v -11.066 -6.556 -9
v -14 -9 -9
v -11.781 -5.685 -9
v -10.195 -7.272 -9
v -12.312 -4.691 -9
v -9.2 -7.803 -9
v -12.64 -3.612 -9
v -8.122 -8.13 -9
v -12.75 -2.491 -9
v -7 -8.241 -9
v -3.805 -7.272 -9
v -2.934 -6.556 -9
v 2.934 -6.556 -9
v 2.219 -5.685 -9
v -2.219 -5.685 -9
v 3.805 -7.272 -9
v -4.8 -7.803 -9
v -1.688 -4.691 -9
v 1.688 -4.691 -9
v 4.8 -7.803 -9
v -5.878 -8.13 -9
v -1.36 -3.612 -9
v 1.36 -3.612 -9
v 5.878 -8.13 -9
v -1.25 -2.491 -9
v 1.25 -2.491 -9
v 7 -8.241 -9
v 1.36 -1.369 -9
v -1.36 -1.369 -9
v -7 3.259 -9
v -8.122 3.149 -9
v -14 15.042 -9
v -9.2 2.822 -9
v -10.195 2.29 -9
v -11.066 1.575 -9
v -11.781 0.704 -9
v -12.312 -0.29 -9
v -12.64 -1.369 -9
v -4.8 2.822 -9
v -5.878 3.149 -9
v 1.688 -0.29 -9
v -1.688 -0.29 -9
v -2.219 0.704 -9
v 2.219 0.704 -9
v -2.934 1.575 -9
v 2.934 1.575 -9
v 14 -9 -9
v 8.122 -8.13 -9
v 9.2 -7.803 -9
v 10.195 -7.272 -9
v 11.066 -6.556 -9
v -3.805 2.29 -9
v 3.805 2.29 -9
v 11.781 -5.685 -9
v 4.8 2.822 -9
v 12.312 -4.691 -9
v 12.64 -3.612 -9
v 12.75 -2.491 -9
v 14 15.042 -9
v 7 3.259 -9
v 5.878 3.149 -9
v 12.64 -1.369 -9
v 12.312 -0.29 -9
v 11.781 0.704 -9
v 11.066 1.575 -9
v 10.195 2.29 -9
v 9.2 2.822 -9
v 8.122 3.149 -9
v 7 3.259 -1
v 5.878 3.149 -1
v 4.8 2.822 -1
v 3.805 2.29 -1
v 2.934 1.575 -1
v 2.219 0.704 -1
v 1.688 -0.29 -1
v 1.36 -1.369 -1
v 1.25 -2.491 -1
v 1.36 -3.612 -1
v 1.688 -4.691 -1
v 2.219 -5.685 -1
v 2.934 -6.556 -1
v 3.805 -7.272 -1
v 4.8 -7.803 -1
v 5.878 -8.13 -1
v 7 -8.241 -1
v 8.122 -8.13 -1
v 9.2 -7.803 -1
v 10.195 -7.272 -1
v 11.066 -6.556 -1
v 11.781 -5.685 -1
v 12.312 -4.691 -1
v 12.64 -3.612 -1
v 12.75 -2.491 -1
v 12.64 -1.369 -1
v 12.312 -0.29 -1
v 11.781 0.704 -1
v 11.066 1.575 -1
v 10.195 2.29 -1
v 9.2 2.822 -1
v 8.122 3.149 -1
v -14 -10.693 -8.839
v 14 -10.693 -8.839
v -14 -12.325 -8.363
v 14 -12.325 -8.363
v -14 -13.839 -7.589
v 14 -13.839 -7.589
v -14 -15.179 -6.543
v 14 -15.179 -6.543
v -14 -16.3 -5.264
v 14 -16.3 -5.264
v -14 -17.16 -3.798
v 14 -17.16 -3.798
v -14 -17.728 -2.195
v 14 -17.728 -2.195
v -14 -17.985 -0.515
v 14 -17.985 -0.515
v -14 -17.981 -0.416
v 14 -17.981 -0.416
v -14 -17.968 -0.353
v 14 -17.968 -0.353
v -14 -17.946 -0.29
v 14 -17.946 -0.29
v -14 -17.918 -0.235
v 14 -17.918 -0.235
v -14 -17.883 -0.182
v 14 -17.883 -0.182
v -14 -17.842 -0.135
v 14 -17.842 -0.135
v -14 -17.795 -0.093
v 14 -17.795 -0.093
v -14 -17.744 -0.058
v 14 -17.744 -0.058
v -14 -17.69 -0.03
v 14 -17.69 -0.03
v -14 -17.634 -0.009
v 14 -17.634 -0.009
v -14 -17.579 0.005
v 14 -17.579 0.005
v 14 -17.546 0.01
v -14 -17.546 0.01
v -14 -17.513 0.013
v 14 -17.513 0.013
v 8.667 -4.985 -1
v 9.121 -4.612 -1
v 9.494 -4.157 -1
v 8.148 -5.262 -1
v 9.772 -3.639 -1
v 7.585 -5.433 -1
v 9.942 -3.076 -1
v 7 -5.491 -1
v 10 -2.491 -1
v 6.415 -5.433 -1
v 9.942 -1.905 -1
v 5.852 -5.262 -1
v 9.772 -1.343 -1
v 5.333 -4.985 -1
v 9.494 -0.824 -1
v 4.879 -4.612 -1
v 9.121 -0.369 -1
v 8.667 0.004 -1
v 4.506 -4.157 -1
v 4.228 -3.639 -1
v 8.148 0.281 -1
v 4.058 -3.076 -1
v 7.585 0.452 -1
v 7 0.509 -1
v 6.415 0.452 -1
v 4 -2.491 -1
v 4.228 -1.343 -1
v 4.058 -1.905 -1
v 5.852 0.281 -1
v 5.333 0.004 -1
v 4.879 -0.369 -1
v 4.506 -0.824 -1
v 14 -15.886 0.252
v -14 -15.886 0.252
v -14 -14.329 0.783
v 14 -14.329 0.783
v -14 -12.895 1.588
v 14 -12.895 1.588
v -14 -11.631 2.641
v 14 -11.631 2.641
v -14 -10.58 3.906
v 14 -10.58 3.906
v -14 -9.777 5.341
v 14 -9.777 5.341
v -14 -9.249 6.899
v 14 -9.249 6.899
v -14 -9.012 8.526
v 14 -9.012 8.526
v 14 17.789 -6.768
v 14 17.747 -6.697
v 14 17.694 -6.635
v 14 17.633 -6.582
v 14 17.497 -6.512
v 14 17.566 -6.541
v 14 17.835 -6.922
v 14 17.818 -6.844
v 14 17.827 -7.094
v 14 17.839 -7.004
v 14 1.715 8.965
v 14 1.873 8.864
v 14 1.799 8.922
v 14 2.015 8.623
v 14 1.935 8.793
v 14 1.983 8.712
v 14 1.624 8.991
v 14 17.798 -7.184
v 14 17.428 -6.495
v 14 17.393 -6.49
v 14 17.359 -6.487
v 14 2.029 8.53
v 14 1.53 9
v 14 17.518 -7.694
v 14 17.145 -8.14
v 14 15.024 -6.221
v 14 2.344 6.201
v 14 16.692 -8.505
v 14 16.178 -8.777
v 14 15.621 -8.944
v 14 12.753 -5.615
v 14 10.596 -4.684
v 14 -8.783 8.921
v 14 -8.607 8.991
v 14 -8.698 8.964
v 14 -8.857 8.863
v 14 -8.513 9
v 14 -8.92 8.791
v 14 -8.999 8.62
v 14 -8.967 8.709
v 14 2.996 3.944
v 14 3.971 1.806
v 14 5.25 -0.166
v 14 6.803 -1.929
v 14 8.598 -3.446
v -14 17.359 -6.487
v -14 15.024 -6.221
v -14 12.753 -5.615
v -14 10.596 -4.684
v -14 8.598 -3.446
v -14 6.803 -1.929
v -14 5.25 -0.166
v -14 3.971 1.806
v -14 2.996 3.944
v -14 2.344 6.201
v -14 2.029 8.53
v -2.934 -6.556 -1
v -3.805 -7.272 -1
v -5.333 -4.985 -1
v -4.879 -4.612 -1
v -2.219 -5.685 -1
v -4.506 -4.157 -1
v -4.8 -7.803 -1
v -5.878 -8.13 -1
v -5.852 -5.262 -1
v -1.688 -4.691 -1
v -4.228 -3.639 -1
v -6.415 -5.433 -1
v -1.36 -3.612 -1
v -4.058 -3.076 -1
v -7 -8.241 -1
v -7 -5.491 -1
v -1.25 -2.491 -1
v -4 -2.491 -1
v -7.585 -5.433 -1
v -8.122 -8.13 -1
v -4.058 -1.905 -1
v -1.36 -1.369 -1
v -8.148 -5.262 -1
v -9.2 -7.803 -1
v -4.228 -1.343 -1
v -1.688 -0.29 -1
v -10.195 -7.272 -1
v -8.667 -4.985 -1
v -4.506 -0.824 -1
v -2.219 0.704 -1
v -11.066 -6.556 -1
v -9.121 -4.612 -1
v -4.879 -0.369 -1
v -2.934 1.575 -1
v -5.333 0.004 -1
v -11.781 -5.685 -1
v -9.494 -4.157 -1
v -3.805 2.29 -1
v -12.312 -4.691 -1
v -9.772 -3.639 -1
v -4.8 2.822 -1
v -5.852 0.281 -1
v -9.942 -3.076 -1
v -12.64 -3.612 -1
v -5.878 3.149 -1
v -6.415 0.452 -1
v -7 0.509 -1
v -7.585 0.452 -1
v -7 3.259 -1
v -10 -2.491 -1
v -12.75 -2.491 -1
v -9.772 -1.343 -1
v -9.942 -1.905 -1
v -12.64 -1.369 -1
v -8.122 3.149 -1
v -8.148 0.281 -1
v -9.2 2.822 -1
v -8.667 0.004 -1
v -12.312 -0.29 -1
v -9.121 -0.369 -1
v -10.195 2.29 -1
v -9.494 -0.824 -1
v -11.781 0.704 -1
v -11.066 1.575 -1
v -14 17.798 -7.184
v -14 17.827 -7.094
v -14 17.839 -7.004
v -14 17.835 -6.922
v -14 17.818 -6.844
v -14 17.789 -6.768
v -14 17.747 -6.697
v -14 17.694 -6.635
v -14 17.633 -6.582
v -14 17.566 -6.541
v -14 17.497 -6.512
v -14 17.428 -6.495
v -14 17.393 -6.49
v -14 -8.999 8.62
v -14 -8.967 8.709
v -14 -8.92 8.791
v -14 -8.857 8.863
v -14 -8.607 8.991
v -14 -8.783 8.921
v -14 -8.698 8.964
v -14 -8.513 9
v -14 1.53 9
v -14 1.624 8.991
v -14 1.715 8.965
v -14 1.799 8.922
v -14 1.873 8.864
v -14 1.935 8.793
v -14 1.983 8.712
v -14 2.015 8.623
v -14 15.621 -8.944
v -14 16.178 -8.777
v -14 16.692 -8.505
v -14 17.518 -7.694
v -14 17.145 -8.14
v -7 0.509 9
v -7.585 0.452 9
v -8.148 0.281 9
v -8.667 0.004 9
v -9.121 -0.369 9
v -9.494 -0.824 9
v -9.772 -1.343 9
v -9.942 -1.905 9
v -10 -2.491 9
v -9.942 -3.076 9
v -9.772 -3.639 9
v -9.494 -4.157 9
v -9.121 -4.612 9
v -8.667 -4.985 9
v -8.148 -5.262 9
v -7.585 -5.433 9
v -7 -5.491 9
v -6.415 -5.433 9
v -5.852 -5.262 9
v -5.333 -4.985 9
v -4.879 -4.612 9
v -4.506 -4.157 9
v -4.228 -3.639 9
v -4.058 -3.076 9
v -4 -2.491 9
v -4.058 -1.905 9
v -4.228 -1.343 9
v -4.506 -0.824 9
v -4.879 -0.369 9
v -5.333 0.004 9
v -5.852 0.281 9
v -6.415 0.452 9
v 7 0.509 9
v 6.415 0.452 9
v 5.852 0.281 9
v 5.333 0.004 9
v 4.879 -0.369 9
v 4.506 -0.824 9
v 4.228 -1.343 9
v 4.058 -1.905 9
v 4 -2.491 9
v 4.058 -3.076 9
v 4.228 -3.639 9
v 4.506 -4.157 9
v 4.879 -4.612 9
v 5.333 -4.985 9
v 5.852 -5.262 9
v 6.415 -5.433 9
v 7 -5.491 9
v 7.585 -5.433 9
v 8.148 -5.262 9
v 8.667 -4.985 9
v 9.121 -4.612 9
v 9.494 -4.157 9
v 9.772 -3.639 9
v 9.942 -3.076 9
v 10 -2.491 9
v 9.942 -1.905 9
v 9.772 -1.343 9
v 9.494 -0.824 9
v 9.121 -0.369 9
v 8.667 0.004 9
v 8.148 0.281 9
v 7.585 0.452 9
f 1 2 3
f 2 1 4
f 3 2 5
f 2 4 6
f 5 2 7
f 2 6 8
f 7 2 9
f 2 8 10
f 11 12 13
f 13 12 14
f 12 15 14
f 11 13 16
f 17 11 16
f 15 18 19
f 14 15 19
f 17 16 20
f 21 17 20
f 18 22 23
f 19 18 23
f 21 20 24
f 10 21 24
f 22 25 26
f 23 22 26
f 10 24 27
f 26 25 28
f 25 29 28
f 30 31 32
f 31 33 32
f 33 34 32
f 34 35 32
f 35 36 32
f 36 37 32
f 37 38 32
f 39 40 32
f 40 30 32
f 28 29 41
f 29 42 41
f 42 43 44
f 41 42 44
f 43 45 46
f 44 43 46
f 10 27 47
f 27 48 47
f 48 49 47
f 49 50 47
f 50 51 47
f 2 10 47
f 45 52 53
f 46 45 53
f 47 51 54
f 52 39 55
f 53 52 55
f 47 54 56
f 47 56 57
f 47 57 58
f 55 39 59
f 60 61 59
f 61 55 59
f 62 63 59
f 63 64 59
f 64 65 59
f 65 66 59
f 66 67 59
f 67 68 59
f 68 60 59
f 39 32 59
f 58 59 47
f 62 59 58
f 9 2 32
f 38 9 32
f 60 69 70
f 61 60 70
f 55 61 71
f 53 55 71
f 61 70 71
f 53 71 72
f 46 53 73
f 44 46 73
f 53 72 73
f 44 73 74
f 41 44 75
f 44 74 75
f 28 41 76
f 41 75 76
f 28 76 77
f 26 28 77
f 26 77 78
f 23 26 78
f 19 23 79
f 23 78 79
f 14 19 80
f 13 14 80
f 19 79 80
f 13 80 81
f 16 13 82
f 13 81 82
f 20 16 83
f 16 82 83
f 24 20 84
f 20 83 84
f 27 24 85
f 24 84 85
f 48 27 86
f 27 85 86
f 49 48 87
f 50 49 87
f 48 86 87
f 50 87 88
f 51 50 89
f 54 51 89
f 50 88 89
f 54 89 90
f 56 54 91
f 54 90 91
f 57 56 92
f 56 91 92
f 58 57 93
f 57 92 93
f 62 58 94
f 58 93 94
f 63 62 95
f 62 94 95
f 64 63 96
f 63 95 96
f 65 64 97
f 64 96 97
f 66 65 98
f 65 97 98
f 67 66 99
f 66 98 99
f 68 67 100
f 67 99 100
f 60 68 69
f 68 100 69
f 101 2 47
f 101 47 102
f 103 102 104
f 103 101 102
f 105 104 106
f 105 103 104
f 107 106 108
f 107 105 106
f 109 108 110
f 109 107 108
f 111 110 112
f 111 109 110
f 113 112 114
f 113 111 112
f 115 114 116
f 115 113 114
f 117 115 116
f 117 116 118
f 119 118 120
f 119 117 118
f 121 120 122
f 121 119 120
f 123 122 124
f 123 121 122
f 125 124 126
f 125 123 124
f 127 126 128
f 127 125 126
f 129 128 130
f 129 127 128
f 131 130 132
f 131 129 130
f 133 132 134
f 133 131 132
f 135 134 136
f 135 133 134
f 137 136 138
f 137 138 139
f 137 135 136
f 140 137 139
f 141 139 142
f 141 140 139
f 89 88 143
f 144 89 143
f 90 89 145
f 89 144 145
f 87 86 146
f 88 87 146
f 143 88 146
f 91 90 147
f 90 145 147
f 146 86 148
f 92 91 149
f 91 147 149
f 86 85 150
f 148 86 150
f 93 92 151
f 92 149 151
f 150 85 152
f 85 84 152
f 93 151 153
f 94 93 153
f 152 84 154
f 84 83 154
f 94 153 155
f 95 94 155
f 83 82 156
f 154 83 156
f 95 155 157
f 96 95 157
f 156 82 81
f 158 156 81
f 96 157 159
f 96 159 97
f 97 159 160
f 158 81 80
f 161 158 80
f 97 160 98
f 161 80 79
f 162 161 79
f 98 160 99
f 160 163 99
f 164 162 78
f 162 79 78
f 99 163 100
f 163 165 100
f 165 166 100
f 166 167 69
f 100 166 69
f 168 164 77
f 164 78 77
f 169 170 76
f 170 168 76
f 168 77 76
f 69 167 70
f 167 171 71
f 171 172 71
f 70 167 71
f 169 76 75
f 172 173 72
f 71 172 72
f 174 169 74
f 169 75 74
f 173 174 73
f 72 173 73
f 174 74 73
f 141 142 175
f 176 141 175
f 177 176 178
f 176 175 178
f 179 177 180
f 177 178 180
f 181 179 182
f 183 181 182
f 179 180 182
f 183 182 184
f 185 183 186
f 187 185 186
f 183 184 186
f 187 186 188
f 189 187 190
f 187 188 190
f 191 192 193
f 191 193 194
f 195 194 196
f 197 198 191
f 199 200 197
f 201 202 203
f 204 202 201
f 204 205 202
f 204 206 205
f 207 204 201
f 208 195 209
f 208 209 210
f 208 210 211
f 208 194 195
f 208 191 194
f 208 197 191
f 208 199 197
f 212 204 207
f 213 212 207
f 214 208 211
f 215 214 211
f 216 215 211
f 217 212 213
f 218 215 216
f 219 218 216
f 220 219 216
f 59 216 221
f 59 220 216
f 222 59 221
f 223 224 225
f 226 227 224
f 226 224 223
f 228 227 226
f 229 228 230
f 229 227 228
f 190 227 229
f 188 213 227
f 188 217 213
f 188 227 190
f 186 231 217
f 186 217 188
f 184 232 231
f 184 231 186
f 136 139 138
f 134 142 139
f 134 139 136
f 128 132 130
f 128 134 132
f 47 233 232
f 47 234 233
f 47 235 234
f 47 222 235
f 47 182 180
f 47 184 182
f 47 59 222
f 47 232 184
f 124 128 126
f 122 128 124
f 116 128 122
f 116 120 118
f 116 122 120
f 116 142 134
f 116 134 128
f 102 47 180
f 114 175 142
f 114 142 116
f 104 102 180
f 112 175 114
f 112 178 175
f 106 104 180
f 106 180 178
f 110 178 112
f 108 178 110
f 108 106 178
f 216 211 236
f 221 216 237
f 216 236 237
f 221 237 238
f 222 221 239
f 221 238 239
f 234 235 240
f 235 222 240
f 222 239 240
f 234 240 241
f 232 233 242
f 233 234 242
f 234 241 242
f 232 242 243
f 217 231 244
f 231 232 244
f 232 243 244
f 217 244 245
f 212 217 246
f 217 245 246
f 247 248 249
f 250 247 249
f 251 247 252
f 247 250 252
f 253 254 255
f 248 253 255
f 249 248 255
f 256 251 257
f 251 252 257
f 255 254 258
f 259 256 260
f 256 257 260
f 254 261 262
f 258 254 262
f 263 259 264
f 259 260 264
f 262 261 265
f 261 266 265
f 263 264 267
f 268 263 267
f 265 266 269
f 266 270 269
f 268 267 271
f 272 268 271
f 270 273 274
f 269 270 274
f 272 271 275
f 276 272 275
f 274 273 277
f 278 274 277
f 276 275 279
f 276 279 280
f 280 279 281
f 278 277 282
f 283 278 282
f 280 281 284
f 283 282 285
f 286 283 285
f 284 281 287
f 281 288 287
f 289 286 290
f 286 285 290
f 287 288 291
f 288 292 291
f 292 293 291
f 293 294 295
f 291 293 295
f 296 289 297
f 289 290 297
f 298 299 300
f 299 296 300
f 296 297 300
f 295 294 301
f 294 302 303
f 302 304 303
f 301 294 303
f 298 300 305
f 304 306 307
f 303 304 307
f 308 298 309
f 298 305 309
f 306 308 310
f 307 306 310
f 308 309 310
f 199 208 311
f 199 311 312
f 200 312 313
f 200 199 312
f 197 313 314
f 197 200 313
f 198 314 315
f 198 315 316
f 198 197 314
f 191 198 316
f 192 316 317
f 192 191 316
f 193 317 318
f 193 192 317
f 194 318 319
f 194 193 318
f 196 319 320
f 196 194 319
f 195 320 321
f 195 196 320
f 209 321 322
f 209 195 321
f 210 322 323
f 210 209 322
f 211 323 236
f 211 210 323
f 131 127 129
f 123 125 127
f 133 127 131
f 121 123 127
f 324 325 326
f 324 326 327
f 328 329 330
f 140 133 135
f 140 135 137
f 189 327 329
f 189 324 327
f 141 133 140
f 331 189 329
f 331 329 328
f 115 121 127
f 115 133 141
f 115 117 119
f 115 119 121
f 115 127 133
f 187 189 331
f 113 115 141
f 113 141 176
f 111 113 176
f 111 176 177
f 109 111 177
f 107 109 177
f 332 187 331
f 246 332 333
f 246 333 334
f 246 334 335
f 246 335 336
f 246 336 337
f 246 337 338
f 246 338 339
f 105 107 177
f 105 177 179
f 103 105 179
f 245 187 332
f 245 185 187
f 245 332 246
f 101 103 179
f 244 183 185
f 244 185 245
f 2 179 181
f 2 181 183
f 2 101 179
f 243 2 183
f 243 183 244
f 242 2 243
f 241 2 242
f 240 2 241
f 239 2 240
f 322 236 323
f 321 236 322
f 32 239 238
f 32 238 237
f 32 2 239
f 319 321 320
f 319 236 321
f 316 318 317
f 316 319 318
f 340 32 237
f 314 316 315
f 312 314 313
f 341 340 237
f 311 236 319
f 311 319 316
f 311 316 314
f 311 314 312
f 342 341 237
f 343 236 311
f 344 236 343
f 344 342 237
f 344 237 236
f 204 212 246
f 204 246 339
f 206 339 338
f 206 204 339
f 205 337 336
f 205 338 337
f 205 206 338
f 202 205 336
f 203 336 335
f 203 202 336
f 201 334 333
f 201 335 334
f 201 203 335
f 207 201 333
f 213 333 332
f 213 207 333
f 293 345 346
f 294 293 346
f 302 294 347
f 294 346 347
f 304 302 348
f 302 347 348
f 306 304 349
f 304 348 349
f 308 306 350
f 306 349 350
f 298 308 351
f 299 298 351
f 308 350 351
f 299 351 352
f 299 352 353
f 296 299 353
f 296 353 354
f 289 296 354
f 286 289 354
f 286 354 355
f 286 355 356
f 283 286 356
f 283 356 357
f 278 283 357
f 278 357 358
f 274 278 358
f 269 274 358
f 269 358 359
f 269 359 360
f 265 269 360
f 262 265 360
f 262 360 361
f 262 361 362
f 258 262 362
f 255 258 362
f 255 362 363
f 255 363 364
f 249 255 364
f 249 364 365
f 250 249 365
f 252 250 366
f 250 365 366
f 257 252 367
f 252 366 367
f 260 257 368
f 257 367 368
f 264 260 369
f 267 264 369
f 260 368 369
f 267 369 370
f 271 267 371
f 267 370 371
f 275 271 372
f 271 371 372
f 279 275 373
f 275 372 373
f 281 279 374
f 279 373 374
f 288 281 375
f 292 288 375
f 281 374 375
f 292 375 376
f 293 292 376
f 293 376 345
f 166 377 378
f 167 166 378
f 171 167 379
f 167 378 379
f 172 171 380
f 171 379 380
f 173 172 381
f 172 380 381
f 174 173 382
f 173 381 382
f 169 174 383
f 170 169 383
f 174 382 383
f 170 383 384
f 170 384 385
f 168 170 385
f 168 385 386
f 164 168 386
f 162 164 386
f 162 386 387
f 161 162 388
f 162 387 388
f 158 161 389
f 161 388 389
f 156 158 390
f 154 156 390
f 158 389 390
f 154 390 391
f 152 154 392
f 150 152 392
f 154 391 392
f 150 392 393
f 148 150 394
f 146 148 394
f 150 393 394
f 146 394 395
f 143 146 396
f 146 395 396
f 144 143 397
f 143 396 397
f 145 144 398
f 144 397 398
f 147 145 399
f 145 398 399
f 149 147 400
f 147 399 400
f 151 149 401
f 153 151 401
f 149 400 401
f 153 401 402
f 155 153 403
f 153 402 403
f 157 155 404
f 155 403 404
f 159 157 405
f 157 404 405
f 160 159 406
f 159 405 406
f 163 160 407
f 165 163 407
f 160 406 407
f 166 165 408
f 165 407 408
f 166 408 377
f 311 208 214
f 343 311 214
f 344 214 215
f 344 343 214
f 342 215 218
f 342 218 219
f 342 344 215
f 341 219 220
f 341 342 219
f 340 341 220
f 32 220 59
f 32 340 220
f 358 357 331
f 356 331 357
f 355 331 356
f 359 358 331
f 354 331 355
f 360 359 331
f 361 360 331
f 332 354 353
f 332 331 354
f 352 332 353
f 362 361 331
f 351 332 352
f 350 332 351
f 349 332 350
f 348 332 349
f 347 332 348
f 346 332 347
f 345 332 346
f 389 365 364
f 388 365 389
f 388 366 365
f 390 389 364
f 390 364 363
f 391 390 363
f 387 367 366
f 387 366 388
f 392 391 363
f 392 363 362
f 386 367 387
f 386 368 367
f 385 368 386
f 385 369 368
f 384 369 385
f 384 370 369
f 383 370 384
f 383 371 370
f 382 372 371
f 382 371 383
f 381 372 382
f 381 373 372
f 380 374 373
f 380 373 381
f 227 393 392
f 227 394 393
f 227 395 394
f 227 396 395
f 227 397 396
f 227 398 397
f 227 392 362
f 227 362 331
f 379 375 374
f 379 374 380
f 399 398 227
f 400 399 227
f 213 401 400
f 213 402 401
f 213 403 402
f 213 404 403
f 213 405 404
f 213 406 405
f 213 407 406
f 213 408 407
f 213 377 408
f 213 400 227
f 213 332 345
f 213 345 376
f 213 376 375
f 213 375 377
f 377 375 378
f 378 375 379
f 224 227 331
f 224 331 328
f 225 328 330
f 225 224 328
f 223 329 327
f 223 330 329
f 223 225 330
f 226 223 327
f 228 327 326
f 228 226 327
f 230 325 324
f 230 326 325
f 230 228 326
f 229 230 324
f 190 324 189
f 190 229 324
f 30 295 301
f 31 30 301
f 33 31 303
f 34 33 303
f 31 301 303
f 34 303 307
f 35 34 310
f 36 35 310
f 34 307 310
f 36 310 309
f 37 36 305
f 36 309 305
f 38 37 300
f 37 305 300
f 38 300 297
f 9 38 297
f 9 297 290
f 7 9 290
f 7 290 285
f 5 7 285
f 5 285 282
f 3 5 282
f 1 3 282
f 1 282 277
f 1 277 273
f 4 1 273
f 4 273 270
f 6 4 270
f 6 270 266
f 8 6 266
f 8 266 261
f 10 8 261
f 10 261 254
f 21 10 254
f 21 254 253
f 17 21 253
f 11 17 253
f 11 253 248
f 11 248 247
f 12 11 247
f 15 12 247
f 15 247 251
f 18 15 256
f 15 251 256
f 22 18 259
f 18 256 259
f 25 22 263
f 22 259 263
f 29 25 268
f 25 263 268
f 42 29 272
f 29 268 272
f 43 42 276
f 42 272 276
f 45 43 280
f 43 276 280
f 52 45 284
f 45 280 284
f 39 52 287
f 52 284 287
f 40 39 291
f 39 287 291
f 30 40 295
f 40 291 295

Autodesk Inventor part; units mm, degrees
ref_plane "YZ Plane" through (0, 0, 0) normal (1, 0, 0) x (0, 1, 0)
ref_plane "XZ Plane" through (0, 0, 0) normal (0, 1, 0) x (-1, 0, 0)
ref_plane "XY Plane" through (0, 0, 0) normal (0, 0, 1) x (1, 0, 0)
sketch "Szkic1" plane through (0, 0, 0) normal (0, 0, 1) x (1, 0, 0)
  line L0 (-14, 18) -> (14, 18)
  line L1 (14, 18) -> (14, -18)
  line L2 (14, -18) -> (-14, -18)
  line L3 (-14, -18) -> (-14, 18)
  line L4 (-14, 18) -> (14, -18) construction
  line L5 (14, 18) -> (-14, -18) construction
  point P0 (0, 0)
  dimension "d0" = 28
  dimension "d1" = 36
extrude "Wyciągnięcie proste1" add sketch "Szkic1" along normal mid plane 18
sketch "Szkic3" plane through (0, 0, 0) normal (1, 0, 0) x (0, 1, 0)
  line L0 (-18, 9) -> (-18, -9) construction
  line L1 (-18, 9) -> (18, 9) construction
  line L2 (18, 9) -> (18, -9) construction
  circle A0 centre (-18, 9) radius 9
  circle A1 centre (18, 9.5) radius 16
  point P0 (0, 0)
  dimension "d4" = 18
  dimension "d6" = 32
  dimension "d7" = 0.5
extrude "Wyciągnięcie proste2" cut sketch "Szkic3" along normal mid plane 28
fillet "Zaokrąglenie1" radius 3 1 edges at (0, 18, -9)
fillet "Zaokrąglenie2" radius 9 1 edges at (0, -18, -9)
fillet "Zaokrąglenie3" radius 0.5 5 edges at (0, -9, 9) (0, 2.0078, 9) (0, -18, -0.0001) (0, -18, 0) (0, 18, -6.5)
sketch "Szkic4" plane through (0, 0, -9) normal (0, 0, -1) x (-1, 0, 0)
  line L0 (14, -9) -> (-14, -9) projected
  line L1 (14, -9) -> (14, 15.042) projected
  line L2 (-14, 15.042) -> (14, 15.042) projected
  line L3 (-14, 15.042) -> (-14, -9) projected
  line L4 (-14, 2.0294) -> (14, 2.0294) projected
  line L5 (14, -9.0125) -> (-14, -9.0125) projected
  line L6 (0, 0) -> (0, 3.9534) construction
  point P0 (-7, -2.4906)
  point P1 (7, -2.4906)
  point P2 (-12.5, 2.0294)
  point P3 (12.5, 2.0294)
  point P4 (12.5, -7.0104)
  point P5 (-12.5, -7.0104)
  dimension "d14" = 4.52
  dimension "d15" = 14
hole "Otwór1" at (7, -2.4906, -9) at (-7, -2.4906, -9) direction (0, 0, 1) diameter 6 end through all counterbore diameter 11.5 counterbore depth 8
properties part number "Zawias" material "Stal nierdzewna"
